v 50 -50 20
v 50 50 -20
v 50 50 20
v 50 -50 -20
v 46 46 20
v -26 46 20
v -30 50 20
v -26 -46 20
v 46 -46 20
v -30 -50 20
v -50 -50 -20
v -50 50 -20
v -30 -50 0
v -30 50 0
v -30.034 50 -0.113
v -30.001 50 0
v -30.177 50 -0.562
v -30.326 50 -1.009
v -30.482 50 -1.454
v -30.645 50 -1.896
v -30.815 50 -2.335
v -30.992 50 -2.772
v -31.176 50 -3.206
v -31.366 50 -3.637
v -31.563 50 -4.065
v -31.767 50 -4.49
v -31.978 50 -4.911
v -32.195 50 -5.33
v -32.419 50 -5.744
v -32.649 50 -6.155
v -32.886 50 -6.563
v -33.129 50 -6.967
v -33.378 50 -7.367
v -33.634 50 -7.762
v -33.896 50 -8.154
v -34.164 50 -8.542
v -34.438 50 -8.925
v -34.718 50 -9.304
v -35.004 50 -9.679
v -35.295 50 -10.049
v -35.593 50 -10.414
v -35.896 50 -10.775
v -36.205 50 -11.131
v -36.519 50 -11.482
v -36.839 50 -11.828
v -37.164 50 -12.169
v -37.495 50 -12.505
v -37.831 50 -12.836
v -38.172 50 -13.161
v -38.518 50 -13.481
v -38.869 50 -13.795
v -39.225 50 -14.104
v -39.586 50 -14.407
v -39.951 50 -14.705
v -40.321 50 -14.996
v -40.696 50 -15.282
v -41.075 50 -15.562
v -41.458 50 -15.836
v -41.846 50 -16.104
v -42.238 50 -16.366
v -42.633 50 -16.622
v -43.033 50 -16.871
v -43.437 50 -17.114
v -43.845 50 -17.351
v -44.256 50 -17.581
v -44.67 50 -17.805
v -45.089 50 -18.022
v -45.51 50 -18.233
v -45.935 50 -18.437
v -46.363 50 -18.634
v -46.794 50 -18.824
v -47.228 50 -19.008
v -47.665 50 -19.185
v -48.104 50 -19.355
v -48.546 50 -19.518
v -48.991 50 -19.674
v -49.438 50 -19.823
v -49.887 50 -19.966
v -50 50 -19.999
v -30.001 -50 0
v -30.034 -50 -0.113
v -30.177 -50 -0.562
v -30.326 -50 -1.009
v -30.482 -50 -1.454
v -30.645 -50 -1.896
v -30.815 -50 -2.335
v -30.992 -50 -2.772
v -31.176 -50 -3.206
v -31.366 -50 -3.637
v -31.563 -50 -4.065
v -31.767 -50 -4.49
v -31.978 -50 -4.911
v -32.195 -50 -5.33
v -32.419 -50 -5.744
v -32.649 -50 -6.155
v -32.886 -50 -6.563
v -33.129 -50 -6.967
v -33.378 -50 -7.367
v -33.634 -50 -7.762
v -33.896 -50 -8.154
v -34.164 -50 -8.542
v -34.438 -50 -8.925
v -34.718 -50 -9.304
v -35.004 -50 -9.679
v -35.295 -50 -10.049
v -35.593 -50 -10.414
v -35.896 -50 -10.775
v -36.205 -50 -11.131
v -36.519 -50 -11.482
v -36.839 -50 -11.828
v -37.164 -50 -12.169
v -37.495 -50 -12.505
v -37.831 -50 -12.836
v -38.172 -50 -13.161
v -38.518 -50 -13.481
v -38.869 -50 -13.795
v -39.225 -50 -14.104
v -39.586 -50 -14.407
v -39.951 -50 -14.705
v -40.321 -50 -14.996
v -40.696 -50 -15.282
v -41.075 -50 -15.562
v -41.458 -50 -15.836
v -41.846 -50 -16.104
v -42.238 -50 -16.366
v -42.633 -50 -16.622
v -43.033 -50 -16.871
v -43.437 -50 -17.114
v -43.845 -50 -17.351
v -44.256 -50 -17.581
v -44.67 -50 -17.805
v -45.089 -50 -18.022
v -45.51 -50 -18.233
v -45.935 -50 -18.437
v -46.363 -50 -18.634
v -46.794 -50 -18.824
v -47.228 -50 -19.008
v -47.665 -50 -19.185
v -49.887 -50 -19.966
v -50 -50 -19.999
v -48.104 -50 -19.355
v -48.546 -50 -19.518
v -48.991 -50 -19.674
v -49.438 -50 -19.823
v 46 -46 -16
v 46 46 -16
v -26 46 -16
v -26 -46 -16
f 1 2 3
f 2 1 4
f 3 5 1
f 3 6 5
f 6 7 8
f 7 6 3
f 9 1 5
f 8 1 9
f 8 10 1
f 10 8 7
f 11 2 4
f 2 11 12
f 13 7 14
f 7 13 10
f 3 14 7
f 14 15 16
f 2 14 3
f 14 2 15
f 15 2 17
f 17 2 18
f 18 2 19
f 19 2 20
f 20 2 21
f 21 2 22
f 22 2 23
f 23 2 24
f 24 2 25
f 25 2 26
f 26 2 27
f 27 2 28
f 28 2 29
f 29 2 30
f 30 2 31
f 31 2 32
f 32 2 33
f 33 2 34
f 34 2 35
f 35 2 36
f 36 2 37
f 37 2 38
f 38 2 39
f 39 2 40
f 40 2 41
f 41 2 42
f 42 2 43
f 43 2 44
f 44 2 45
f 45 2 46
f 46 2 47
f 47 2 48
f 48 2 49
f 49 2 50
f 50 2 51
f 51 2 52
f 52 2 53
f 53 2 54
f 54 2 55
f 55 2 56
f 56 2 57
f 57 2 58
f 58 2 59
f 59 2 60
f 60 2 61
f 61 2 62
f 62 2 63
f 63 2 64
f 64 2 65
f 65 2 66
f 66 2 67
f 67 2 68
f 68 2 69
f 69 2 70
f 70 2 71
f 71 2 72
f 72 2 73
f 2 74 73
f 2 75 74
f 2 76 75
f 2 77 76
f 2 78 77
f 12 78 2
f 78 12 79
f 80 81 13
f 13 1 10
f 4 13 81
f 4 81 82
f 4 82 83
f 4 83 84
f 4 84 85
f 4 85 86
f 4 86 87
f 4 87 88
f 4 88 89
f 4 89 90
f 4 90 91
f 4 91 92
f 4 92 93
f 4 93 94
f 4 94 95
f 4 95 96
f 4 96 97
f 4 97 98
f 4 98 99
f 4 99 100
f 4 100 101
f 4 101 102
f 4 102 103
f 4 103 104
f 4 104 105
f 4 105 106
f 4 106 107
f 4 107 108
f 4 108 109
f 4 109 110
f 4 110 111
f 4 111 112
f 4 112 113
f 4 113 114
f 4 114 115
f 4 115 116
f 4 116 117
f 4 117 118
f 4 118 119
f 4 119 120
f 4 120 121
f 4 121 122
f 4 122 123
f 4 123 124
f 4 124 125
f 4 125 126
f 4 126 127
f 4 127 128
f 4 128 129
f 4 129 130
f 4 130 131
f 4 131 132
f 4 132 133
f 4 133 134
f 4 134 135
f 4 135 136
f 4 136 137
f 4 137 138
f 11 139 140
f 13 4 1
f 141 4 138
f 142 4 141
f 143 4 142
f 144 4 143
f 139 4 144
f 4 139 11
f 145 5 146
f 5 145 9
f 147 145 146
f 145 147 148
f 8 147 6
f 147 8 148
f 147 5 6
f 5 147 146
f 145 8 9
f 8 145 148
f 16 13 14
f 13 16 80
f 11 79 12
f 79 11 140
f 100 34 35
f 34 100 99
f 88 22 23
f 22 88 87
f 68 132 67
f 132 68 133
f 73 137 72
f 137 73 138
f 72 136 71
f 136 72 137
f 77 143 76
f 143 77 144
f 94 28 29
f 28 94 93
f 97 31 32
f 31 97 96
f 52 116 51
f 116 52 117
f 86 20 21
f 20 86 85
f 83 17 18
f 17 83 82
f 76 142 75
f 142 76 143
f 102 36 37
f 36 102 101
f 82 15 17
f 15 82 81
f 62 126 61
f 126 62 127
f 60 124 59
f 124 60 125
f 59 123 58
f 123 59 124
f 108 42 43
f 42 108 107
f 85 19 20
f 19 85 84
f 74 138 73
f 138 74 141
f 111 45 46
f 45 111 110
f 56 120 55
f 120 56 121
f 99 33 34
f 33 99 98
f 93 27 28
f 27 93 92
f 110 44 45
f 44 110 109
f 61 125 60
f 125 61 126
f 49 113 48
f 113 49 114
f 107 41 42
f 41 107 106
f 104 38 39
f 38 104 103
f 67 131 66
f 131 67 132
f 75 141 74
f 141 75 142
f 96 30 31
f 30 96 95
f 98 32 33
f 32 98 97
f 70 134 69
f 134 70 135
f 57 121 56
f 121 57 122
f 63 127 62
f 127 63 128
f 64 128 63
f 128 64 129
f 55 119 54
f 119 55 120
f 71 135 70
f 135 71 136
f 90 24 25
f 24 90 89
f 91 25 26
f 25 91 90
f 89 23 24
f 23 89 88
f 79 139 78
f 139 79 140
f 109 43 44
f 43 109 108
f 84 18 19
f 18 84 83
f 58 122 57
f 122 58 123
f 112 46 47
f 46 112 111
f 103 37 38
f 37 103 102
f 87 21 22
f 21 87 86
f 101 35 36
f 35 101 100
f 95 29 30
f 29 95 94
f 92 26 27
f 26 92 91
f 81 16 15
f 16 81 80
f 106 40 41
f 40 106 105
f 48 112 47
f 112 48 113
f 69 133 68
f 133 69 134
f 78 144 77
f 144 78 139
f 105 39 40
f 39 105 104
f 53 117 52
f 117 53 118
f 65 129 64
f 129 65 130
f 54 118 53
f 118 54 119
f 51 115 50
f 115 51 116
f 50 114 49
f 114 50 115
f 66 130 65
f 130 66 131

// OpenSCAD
botColor = "red";
length = 100;
width = 100;
height = 40;
scoopSize = 20;
scoopSharpness = 0.5; // 0 = sharp, 5 = blunt
shellThickness = 4;

scoopRadius = scoopSize * (scoopSharpness + 1);
shellLength = length - scoopSize;

color(botColor) {
    union() {
        shell();
        ramp();
    }
}

module shell() {
    translate([scoopSize / 2, 0, 0]) {
        difference() {
            cube(size = [shellLength, width, height], center = true);
            translate([0, 0, shellThickness]) {
                t2 = shellThickness * 2;
                cube(size = [shellLength - t2, width - t2, height], center = true);
            }
        }
    }
}

module ramp() {
    z1 = scoopSize / 2;
    x1 = scoopSize / 2;

    z2 = -z1;
    x2 = -x1;

    q = sqrt(pow(z2-z1, 2) + pow(x2-x1, 2));

    z3 = (z1+z2) / 2;
    x3 = (x1+x2) / 2;

    rr = pow(scoopRadius, 2);

    z = z3 + sqrt(rr - pow(q/2, 2)) * (x1-x2) / q;
    x = x3 + sqrt(rr - pow(q/2, 2)) * (z2-z1) / q;

    sx = -(length / 2 - scoopSize / 2);
    sz = -(height / 2 - scoopSize / 2);

    translate([sx, 0, sz]) {
        difference() {
            cube(size = [scoopSize, width, scoopSize], center = true);

            translate([x, 0, z]) {
                rotate([90, 0, 0]) {
                    cylinder(h = width + 1, r = scoopRadius, center = true, $fn = 400);
                }
            }
        }
    }
}
